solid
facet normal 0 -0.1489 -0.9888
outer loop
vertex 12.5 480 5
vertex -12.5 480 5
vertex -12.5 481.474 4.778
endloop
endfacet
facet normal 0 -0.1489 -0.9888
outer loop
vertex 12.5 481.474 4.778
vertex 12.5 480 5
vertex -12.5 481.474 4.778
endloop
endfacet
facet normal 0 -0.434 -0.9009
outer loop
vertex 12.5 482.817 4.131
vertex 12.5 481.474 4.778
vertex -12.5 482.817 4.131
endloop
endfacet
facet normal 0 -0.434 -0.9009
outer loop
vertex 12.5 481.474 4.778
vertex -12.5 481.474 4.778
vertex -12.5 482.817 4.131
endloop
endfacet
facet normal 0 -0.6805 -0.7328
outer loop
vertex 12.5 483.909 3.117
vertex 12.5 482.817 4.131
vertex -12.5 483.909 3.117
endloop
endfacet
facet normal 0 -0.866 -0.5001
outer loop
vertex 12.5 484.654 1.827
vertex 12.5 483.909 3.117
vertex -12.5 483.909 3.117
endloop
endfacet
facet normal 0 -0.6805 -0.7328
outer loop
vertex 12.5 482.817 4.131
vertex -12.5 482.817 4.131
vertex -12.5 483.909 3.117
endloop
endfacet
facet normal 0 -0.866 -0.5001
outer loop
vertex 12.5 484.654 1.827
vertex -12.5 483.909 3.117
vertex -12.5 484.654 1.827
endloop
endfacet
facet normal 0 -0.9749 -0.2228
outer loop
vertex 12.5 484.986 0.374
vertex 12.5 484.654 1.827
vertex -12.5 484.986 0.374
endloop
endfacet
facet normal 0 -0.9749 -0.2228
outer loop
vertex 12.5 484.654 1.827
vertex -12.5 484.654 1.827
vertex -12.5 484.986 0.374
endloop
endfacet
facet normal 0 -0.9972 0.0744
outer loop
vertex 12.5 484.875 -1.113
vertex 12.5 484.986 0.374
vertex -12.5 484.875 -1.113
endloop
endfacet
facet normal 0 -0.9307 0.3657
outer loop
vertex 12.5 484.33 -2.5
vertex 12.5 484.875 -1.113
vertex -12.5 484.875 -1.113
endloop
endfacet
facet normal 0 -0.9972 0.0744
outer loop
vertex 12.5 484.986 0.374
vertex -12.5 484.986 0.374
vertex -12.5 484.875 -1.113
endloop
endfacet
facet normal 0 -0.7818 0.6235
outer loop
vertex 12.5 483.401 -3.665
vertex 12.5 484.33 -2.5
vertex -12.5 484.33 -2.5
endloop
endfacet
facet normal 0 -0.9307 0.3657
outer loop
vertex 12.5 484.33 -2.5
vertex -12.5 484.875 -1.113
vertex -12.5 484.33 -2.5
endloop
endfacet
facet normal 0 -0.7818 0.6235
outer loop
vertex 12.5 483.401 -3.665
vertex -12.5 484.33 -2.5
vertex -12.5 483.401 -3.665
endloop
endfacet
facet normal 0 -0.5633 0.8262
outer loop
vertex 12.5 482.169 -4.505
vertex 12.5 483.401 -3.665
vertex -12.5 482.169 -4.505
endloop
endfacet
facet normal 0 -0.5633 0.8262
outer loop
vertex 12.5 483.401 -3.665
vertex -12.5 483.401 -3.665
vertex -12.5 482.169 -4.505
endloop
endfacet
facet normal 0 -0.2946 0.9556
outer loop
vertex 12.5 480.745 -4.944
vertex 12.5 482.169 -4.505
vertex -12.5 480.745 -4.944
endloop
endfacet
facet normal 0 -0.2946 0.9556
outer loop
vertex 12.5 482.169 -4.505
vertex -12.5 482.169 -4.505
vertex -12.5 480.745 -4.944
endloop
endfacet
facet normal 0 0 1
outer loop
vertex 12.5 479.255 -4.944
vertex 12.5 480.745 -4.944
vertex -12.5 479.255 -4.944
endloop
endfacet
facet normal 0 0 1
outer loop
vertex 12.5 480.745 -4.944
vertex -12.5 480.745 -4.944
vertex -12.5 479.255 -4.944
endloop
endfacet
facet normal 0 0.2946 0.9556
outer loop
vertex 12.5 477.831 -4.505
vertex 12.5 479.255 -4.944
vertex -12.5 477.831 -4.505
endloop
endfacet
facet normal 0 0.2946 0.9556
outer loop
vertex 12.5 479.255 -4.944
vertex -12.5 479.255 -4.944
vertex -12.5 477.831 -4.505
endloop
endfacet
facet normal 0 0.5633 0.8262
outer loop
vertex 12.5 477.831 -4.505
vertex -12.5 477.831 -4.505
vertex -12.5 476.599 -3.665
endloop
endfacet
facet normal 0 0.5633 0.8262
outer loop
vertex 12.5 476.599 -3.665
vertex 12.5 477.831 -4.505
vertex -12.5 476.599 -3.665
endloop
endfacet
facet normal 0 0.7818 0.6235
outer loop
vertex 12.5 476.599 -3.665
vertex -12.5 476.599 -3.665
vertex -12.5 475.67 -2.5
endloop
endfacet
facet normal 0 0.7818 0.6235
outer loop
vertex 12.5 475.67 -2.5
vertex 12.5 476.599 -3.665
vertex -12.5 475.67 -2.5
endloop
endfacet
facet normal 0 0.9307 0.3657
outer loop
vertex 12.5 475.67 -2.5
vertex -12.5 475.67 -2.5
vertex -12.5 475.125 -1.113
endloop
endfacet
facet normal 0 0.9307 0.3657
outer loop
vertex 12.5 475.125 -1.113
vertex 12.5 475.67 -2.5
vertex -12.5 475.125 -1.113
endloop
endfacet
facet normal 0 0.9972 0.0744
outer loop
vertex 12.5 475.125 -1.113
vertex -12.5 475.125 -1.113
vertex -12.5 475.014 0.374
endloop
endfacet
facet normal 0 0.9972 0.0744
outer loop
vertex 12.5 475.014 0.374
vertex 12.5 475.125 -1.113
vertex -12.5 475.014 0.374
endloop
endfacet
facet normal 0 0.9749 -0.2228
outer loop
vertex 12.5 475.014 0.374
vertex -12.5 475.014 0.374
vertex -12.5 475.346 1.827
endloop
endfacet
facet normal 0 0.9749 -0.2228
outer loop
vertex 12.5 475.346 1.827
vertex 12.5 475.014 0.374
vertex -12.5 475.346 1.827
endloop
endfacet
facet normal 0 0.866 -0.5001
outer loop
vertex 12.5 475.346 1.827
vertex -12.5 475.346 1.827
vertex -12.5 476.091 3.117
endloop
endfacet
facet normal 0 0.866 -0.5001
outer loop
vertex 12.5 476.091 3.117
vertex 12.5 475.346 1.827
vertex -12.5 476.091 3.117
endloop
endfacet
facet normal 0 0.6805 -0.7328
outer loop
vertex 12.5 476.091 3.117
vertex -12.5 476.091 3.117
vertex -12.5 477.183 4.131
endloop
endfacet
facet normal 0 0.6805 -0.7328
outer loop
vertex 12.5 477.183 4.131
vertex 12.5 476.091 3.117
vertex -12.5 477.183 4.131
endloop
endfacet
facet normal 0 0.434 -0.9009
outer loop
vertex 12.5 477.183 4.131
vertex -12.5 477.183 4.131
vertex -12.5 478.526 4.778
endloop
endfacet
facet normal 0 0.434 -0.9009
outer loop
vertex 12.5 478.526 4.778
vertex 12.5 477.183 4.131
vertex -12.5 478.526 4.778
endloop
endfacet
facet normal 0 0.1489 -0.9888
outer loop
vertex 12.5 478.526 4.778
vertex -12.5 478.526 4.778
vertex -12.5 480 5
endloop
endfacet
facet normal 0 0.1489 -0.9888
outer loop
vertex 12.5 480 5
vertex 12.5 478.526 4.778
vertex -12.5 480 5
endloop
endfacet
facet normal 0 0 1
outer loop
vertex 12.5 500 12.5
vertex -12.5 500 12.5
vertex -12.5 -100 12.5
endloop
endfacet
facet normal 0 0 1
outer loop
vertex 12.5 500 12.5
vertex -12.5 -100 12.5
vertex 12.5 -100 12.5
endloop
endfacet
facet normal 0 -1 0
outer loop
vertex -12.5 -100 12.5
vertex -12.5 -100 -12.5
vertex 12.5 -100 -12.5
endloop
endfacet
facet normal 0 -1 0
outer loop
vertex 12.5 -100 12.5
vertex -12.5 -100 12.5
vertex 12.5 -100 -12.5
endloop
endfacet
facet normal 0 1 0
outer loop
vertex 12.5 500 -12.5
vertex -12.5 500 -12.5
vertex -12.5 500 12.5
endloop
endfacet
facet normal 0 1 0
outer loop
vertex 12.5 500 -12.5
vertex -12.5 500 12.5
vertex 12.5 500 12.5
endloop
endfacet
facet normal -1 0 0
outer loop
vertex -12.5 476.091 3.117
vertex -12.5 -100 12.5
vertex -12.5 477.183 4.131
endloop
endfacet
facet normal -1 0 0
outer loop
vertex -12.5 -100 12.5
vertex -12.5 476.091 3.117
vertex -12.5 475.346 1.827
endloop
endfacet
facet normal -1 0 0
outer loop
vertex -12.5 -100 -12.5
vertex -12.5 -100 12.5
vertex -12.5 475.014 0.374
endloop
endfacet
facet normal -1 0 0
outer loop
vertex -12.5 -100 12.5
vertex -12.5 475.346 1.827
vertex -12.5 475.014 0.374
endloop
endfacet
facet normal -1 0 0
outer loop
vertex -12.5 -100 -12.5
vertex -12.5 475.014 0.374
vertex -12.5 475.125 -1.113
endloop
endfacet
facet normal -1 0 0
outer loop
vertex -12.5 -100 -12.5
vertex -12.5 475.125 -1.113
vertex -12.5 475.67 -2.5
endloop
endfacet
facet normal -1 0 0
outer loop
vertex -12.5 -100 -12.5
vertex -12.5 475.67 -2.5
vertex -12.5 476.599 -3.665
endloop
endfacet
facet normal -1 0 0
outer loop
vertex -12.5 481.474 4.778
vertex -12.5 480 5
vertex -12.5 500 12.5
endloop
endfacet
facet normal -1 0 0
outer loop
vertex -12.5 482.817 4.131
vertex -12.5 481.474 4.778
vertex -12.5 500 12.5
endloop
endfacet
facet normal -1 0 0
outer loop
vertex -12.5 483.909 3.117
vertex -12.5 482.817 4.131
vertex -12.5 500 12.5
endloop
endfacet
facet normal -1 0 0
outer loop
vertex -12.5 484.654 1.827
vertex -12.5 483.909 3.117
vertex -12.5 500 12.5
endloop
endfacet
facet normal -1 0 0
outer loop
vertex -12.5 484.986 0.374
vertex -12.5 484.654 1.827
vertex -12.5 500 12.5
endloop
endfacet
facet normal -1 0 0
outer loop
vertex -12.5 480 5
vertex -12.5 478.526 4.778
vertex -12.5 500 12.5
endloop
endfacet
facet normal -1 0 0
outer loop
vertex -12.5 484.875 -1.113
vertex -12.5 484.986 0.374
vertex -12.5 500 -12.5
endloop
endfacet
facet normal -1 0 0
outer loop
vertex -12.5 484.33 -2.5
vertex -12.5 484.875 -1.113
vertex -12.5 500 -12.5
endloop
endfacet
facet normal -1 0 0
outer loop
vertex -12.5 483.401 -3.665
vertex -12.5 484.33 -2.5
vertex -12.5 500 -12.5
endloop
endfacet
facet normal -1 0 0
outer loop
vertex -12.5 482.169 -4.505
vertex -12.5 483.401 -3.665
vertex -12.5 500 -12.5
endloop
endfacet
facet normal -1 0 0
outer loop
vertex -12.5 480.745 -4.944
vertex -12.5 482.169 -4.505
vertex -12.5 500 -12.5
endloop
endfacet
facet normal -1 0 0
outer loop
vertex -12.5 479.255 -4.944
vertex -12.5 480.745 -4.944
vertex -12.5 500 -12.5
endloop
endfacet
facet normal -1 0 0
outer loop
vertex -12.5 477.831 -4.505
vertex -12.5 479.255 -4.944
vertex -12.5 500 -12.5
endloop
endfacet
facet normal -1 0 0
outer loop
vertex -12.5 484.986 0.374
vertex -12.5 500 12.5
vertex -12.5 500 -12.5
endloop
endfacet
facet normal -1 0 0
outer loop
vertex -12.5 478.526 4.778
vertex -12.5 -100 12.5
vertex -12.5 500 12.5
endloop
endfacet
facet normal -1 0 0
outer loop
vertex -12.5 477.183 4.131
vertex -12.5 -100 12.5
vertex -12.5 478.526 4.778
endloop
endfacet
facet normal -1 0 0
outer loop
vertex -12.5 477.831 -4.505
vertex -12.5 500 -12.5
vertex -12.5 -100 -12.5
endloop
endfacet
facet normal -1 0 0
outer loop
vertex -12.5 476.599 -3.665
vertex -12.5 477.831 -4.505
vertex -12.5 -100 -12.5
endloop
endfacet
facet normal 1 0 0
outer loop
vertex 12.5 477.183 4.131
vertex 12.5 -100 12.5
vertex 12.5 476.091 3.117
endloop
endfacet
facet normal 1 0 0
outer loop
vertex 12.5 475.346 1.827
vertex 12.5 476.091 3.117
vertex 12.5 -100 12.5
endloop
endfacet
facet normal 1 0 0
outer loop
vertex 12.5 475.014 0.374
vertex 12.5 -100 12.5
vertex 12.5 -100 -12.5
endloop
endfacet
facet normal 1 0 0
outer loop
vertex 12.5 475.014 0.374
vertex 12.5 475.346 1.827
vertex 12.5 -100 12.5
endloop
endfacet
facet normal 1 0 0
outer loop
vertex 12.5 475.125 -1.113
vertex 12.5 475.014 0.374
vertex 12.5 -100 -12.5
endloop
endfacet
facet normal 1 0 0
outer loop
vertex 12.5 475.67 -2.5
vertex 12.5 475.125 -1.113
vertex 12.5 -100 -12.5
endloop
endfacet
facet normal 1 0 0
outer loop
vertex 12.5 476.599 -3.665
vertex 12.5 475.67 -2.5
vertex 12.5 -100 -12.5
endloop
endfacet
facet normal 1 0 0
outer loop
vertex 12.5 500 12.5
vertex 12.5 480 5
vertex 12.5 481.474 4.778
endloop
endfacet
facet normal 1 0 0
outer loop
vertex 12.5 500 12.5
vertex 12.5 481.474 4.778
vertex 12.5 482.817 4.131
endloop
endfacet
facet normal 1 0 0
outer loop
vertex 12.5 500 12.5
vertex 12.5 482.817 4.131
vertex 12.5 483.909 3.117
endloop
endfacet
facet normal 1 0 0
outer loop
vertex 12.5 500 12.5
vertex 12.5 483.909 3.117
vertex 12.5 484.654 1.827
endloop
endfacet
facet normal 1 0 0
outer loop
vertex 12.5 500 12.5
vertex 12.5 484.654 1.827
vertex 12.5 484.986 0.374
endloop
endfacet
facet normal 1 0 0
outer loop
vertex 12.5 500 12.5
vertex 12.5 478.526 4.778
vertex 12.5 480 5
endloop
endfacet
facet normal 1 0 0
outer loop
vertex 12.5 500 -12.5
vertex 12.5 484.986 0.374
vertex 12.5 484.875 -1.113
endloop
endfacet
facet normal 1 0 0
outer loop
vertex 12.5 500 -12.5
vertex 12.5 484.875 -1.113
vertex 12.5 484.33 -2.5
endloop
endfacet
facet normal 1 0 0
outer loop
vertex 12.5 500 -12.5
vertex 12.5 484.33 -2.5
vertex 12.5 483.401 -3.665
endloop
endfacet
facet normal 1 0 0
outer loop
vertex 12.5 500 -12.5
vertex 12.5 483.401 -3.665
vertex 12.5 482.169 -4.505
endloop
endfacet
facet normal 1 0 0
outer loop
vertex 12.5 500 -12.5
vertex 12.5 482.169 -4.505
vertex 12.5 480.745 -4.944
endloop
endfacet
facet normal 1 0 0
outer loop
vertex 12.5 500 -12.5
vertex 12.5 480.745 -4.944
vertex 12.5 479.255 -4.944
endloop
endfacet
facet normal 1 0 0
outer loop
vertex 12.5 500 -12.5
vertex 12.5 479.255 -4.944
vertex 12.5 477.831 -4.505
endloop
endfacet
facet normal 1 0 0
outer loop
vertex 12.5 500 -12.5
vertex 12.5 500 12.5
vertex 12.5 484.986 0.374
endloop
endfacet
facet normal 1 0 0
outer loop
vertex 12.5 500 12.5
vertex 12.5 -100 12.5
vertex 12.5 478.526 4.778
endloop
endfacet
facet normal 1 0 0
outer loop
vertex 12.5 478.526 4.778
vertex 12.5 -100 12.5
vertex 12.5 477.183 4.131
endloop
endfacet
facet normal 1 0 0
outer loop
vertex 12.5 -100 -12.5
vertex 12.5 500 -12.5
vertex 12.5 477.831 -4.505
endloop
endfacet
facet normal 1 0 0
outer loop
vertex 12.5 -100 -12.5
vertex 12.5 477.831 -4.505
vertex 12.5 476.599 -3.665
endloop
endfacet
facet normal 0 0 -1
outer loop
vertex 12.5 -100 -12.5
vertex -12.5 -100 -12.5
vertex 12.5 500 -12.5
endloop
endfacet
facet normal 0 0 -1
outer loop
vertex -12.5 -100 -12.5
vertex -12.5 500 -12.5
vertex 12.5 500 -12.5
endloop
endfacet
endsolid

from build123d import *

# Parameters (mm, degrees)
SKETCH1_W                = 25
SKETCH1_H                = 25
BOSS_EXTRUDE1_DEPTH      = 500
BOSS_EXTRUDE1_DEPTH_BACK = 100
SKETCH2_R                = 5
CUT_EXTRUDE1_DEPTH       = 500


with BuildPart() as part:
    # Sketch1 → Boss-Extrude1 (new body, two sides)
    with BuildSketch(Plane(origin=(0, 0, 0), x_dir=(1, 0, 0), z_dir=(0, 1, 0))) as boss_extrude1_sk:
        Rectangle(SKETCH1_W, SKETCH1_H)
    extrude(amount=BOSS_EXTRUDE1_DEPTH)
    extrude(boss_extrude1_sk.sketch, amount=-BOSS_EXTRUDE1_DEPTH_BACK)

    # Sketch2 → Cut-Extrude1 (cut)
    with BuildSketch(Plane.ZY.offset(12.5)):
        with Locations((0, 480)):
            Circle(SKETCH2_R)
    extrude(amount=-CUT_EXTRUDE1_DEPTH, mode=Mode.SUBTRACT)


solid = part.part
